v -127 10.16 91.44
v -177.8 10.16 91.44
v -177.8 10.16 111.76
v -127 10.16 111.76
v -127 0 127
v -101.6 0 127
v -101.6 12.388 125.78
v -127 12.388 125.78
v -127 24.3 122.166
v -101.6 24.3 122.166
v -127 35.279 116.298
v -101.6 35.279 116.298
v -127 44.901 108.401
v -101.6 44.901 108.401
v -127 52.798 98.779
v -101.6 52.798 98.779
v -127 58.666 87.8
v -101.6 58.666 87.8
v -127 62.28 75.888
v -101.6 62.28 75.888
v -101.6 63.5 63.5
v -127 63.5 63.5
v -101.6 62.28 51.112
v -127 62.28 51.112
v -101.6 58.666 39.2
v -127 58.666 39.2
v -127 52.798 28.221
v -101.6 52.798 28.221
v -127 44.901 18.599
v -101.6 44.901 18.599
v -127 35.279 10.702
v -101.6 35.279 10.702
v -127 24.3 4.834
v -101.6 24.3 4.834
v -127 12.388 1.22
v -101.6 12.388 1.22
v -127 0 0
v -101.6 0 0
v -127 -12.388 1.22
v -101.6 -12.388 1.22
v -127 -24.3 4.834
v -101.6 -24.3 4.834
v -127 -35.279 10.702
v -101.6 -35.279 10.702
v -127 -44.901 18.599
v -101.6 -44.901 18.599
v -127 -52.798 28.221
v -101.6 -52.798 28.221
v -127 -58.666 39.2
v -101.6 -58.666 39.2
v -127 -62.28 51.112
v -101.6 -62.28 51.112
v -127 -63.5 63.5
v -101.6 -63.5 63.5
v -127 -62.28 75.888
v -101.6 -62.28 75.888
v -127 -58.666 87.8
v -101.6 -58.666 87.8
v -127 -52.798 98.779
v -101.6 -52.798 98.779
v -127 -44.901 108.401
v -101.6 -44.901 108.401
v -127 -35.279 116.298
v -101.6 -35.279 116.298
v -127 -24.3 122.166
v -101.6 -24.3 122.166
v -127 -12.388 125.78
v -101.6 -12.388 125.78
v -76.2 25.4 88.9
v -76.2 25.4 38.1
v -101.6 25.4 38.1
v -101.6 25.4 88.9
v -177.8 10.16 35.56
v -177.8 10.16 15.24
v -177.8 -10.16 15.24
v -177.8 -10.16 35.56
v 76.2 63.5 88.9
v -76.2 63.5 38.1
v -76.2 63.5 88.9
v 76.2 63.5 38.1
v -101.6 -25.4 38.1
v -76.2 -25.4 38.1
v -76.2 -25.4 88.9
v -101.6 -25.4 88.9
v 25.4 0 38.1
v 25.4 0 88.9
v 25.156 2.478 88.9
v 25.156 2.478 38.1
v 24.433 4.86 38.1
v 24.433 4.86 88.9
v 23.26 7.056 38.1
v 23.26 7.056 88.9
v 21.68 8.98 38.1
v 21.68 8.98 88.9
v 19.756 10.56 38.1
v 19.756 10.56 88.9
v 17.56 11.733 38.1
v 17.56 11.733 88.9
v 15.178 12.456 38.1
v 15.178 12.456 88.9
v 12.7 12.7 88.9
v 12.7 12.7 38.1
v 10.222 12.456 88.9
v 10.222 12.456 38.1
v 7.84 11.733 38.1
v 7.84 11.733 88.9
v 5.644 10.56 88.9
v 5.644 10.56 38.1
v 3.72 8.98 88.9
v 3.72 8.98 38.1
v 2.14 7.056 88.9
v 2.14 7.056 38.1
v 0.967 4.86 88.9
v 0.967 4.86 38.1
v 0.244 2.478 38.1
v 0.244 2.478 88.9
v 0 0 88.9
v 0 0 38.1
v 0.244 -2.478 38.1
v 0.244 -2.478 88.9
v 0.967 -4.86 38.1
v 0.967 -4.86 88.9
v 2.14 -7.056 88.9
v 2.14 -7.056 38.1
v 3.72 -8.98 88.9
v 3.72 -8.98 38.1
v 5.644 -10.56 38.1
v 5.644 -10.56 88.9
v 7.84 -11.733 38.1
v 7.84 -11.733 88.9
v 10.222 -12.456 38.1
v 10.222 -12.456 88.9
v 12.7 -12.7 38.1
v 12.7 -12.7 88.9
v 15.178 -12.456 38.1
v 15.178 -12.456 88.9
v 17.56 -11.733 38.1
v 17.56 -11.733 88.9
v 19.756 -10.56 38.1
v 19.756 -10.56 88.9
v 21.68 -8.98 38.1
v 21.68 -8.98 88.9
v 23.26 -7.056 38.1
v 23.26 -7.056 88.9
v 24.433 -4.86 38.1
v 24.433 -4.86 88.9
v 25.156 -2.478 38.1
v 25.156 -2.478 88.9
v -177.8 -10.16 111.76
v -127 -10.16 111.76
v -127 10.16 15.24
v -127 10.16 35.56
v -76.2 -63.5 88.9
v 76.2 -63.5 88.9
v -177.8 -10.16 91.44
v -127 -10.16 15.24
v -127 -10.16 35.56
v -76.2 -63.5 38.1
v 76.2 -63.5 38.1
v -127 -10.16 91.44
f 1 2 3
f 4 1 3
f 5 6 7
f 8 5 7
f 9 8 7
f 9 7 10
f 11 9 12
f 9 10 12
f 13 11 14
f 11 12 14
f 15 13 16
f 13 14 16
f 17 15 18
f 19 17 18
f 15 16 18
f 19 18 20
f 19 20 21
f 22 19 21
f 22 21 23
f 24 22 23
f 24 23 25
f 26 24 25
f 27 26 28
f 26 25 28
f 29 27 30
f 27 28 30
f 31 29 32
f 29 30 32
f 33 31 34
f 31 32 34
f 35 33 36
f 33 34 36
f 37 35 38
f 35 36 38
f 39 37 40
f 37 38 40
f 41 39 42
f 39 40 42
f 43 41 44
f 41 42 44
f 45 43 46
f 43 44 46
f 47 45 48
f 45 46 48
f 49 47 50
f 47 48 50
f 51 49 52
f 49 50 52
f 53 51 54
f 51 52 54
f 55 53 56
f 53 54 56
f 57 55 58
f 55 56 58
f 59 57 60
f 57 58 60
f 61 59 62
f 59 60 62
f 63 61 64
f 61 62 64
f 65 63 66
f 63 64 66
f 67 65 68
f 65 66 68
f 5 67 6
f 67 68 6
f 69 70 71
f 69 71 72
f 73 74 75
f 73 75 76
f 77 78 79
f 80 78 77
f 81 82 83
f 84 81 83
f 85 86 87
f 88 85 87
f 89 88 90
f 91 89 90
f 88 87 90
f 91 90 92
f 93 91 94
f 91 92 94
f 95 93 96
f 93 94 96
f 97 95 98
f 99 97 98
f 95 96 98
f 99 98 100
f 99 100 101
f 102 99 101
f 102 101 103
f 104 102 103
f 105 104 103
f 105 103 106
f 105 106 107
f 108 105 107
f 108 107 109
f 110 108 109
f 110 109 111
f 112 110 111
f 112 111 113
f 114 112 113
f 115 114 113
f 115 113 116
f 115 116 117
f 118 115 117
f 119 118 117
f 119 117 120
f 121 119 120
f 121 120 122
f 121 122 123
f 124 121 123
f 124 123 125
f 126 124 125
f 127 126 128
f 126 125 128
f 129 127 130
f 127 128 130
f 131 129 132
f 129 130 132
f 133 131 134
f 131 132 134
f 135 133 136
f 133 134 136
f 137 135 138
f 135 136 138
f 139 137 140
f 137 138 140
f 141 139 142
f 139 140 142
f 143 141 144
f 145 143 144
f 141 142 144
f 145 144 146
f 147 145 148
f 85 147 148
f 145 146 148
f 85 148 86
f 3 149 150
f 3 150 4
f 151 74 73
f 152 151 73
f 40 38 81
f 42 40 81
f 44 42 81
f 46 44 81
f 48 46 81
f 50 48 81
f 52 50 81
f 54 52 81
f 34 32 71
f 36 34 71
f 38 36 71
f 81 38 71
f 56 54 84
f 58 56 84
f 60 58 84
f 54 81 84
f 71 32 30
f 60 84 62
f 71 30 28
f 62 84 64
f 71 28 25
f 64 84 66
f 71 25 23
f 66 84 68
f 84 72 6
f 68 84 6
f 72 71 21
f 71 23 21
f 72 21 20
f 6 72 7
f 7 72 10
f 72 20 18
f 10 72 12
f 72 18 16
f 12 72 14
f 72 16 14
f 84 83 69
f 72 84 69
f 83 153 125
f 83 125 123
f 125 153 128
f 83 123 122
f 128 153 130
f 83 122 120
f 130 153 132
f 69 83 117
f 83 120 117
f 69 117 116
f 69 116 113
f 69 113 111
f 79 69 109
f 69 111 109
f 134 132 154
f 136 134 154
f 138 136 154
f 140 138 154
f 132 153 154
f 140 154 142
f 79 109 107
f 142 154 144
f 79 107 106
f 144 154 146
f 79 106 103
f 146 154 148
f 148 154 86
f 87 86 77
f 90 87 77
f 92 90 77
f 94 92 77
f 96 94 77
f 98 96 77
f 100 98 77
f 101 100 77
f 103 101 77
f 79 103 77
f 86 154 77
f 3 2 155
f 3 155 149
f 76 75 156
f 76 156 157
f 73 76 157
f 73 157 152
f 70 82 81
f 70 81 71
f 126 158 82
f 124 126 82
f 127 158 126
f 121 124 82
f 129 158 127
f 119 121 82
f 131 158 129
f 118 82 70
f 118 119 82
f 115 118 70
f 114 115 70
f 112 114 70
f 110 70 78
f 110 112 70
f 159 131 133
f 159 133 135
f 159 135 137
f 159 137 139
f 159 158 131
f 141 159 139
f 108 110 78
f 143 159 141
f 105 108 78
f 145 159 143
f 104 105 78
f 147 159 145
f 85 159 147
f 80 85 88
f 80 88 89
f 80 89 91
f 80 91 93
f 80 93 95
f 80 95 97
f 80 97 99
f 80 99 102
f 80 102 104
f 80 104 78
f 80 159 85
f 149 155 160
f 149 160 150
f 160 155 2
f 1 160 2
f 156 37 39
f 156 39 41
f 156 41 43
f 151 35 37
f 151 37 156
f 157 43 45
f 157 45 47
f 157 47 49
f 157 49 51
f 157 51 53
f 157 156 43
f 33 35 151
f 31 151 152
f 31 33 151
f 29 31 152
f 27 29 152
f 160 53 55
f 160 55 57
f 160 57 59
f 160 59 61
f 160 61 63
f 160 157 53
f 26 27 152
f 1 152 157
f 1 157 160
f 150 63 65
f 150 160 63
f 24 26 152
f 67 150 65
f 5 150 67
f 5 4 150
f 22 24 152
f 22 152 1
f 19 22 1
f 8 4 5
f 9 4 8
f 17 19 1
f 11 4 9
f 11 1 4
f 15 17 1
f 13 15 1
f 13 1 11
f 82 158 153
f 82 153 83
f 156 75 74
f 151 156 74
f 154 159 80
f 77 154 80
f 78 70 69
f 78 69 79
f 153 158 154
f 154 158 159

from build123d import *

# Parameters (mm, degrees)
SKETCH1_W           = 152.4
SKETCH1_H           = 127
BOSS_EXTRUDE1_DEPTH = 127
SKETCH2_W           = 50.8
SKETCH2_H           = 50.8
BOSS_EXTRUDE2_DEPTH = 25.4
SKETCH3_R           = 63.5
BOSS_EXTRUDE3_DEPTH = 25.4
SKETCH4_W           = 20.32
SKETCH4_H           = 20.32
BOSS_EXTRUDE4_DEPTH = 50.8
SKETCH5_W           = 152.4
SKETCH5_H           = 38.1
CUT_EXTRUDE1_DEPTH  = 253.726809025
SKETCH6_R           = 12.7
CUT_EXTRUDE2_DEPTH  = 209.682294409


with BuildPart() as part:
    # Sketch1 → Boss-Extrude1 (new body)
    with BuildSketch(Plane.XY):
        Rectangle(SKETCH1_W, SKETCH1_H)
    extrude(amount=BOSS_EXTRUDE1_DEPTH)

    # Sketch2 → Boss-Extrude2 (add)
    with BuildSketch(Plane.ZY.offset(76.2)):
        with Locations((63.5, 0)):
            Rectangle(SKETCH2_W, SKETCH2_H)
    extrude(amount=BOSS_EXTRUDE2_DEPTH)

    # Sketch3 → Boss-Extrude3 (add)
    with BuildSketch(Plane.ZY.offset(101.6)):
        with Locations((63.5, 0)):
            Circle(SKETCH3_R)
    extrude(amount=BOSS_EXTRUDE3_DEPTH)

    # Sketch4 → Boss-Extrude4 (add)
    with BuildSketch(Plane.ZY.offset(127)):
        with Locations((25.4, 0)):
            Rectangle(SKETCH4_W, SKETCH4_H)
        with Locations((101.6, 0)):
            Rectangle(SKETCH4_W, SKETCH4_H)
    extrude(amount=BOSS_EXTRUDE4_DEPTH)

    # Sketch5 → Cut-Extrude1 (cut, through all)
    with BuildSketch(Plane(origin=(0, 63.5, 0), x_dir=(1, 0, 0), z_dir=(0, 1, 0))):
        with Locations((0, -107.95)):
            Rectangle(SKETCH5_W, SKETCH5_H)
        with Locations((0, -19.05)):
            Rectangle(SKETCH5_W, SKETCH5_H)
    extrude(amount=-CUT_EXTRUDE1_DEPTH, mode=Mode.SUBTRACT)

    # Sketch6 → Cut-Extrude2 (cut, through all)
    with BuildSketch(Plane.XY.offset(88.9)):
        with Locations((12.7, 0)):
            Circle(SKETCH6_R)
    extrude(amount=-CUT_EXTRUDE2_DEPTH, mode=Mode.SUBTRACT)


solid = part.part
